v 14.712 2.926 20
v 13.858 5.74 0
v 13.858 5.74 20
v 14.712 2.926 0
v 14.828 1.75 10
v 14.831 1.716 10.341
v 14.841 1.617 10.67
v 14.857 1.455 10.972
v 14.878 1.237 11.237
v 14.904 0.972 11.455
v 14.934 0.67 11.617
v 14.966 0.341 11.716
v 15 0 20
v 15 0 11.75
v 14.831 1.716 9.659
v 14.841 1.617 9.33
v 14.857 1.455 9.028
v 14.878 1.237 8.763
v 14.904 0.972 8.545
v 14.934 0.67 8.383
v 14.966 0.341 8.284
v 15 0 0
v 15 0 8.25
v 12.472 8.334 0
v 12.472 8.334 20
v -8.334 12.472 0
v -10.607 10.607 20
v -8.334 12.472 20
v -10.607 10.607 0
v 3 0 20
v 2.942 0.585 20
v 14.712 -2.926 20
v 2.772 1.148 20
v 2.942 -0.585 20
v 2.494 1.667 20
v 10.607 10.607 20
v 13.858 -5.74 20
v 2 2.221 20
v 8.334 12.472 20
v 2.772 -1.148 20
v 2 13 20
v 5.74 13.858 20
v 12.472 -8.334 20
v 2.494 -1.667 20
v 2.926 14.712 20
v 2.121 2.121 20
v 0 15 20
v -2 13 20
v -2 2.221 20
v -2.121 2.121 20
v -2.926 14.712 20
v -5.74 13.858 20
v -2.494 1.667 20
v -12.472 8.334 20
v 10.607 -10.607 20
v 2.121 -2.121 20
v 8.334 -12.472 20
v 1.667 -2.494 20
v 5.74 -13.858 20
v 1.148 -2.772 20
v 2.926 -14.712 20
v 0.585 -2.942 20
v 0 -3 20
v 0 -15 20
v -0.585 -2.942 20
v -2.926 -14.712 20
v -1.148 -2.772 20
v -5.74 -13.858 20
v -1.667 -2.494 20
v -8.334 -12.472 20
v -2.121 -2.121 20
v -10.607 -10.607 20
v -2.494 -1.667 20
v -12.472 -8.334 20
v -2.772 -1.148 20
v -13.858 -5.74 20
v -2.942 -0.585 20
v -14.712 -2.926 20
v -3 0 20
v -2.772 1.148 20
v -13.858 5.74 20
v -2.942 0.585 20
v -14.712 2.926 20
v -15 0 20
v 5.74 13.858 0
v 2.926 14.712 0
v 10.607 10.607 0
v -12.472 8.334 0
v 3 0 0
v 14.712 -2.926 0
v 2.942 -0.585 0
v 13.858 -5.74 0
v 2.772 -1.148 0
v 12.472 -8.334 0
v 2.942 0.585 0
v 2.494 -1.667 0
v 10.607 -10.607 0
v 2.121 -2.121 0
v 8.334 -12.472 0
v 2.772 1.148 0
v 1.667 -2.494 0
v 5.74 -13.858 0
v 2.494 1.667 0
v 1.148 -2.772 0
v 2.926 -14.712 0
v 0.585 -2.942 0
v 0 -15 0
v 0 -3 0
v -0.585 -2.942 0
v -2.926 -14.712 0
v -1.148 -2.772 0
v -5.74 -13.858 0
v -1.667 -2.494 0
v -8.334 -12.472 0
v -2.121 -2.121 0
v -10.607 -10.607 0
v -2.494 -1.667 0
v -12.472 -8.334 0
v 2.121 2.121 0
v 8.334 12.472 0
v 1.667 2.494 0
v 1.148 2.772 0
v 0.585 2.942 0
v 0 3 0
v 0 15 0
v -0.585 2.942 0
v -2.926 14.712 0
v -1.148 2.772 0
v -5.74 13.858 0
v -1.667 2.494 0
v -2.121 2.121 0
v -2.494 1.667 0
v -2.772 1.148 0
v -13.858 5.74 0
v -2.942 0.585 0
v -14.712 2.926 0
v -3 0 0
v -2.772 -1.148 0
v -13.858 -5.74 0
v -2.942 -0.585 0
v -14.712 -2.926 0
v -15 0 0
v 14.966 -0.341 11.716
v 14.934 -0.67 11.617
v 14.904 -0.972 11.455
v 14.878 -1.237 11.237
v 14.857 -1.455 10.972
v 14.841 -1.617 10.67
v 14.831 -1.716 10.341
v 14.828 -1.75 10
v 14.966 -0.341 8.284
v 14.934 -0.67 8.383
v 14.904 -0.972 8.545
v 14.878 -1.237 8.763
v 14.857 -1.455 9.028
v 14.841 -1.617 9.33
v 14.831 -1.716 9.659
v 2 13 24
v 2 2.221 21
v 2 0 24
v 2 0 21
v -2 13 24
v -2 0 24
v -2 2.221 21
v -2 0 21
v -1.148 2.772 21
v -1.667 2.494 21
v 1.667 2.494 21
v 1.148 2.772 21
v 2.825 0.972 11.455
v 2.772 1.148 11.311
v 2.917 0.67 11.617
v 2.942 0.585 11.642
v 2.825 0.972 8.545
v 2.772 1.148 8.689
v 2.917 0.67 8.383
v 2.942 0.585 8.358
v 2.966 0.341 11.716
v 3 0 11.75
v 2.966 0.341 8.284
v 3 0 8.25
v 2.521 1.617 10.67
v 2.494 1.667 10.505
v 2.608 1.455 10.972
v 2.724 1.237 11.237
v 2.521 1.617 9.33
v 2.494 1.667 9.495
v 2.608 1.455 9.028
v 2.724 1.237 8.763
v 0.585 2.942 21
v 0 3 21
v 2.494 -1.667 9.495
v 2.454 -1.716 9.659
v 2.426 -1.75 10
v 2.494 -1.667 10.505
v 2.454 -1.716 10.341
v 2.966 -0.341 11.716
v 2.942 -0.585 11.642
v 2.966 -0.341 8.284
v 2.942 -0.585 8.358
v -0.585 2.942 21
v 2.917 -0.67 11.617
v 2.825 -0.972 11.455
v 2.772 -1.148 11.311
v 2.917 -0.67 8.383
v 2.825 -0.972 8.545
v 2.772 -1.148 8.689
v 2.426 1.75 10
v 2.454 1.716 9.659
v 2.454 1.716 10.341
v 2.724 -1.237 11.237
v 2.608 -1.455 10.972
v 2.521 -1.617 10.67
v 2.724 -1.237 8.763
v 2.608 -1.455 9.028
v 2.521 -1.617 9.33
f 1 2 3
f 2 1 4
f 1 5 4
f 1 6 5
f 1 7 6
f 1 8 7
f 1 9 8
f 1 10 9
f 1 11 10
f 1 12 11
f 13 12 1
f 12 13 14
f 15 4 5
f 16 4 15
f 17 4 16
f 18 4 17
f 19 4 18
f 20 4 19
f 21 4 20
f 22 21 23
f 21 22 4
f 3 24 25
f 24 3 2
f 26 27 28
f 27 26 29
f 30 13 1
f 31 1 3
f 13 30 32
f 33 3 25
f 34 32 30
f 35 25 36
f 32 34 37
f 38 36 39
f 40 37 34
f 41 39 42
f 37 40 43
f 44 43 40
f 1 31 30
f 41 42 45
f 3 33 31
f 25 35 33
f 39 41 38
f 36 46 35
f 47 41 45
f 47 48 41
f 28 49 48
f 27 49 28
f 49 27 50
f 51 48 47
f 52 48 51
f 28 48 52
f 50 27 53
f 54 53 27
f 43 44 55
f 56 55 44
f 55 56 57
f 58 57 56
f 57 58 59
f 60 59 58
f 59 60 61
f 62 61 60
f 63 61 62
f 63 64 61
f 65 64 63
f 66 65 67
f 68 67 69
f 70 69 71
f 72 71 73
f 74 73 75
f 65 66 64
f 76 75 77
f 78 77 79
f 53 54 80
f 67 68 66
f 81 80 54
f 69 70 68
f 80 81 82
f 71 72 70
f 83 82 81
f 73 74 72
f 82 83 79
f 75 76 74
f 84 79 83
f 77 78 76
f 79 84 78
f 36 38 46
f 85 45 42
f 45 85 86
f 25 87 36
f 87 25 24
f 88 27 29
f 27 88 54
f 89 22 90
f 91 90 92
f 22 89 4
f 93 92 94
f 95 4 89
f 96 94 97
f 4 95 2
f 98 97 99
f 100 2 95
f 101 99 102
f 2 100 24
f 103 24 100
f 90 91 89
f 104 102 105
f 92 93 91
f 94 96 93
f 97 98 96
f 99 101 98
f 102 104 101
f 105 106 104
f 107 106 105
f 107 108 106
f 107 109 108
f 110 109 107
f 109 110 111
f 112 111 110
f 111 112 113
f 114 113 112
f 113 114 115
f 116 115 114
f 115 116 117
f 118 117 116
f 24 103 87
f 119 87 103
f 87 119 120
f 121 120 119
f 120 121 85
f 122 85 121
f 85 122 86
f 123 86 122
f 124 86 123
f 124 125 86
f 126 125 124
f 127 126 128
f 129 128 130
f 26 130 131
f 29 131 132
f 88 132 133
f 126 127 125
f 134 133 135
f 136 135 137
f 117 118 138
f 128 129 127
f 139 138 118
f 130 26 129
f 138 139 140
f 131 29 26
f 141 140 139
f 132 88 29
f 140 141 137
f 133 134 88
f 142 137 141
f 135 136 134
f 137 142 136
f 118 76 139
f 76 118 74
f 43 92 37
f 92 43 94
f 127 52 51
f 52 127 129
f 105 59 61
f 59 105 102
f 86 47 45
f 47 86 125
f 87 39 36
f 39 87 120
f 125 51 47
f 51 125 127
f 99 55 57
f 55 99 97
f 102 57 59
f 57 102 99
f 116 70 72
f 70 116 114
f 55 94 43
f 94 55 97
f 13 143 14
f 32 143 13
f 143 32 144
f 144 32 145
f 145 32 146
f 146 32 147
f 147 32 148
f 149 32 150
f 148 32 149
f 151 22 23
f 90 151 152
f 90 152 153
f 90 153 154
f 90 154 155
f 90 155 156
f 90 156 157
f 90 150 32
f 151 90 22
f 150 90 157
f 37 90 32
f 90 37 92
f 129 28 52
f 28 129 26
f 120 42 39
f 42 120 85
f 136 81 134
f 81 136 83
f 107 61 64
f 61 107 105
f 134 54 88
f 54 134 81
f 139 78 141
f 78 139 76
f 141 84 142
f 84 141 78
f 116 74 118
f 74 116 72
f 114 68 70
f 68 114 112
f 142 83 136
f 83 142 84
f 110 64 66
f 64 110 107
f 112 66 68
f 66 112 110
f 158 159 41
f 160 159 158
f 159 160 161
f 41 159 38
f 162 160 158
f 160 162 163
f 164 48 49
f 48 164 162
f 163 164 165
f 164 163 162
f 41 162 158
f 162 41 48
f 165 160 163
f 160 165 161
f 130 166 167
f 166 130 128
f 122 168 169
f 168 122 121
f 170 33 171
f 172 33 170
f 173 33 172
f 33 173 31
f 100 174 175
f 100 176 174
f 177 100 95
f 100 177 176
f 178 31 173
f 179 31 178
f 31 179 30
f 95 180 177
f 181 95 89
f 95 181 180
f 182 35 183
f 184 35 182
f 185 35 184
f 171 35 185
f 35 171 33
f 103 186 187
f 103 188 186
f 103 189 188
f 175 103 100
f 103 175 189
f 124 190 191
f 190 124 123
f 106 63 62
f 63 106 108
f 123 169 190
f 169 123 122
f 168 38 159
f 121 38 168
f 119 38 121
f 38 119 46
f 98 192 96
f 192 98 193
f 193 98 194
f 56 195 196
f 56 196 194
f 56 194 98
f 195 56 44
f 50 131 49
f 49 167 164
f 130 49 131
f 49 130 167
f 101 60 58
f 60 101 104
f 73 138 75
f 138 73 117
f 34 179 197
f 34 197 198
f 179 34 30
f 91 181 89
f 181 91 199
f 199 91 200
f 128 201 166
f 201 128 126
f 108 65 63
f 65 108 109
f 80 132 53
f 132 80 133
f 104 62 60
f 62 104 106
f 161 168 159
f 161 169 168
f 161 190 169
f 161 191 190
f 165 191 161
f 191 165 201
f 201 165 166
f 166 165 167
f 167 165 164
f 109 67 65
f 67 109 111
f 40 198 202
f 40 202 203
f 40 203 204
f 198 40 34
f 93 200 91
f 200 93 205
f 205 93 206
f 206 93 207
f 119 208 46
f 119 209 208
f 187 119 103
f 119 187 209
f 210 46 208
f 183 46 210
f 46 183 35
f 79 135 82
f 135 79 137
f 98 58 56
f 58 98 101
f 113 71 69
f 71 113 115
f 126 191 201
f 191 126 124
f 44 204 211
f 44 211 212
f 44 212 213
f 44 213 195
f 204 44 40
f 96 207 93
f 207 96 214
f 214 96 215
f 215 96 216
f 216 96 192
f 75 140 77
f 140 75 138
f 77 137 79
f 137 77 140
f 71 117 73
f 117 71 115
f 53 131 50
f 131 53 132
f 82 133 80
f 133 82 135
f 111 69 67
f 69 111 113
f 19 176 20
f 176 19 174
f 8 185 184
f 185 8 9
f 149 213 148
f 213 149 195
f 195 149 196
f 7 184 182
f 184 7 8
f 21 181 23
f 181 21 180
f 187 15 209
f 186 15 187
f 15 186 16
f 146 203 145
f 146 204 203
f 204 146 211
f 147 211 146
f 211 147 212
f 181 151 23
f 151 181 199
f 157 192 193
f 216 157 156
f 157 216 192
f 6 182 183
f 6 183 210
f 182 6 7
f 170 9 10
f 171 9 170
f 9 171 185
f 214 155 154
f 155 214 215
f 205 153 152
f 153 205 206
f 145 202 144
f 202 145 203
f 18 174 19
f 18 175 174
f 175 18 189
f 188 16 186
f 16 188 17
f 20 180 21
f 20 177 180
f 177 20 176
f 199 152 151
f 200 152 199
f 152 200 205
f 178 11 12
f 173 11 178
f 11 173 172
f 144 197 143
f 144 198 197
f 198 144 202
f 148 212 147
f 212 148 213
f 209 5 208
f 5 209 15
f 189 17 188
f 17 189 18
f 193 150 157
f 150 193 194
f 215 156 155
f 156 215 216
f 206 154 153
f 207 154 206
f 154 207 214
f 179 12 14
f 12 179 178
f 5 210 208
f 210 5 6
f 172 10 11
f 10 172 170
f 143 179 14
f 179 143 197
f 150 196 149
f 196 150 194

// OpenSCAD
$fn = 32;

// ----------------------------------------------------------------------
// Control knob: pointer knob
// ----------------------------------------------------------------------

// --- parameters (mm) ---
rib_w = 4;                // pointer rib width
rib_h = 5;                // pointer rib height
knob_d = 30;              // knob body diameter
knob_h = 20;              // knob body height
bore_d = 6;               // shaft bore diameter
set_d = 3.5;              // set screw bore diameter

rib_poke = rib_h - 1;  // rib height above the top
total_h = knob_h + rib_h - 1;  // overall height

difference() {
  union() {
    cylinder(h = knob_h, d = knob_d);
    translate([-rib_w / 2, 0, knob_h - 1])
      cube([rib_w, knob_d / 2 - 2, rib_h]);
  }
  translate([0, 0, -1]) cylinder(h = knob_h + 2, d = bore_d);
  translate([-1, 0, knob_h / 2]) rotate([0, 90, 0])
    cylinder(h = knob_d / 2 + bore_d / 2 + 2, d = set_d);}
